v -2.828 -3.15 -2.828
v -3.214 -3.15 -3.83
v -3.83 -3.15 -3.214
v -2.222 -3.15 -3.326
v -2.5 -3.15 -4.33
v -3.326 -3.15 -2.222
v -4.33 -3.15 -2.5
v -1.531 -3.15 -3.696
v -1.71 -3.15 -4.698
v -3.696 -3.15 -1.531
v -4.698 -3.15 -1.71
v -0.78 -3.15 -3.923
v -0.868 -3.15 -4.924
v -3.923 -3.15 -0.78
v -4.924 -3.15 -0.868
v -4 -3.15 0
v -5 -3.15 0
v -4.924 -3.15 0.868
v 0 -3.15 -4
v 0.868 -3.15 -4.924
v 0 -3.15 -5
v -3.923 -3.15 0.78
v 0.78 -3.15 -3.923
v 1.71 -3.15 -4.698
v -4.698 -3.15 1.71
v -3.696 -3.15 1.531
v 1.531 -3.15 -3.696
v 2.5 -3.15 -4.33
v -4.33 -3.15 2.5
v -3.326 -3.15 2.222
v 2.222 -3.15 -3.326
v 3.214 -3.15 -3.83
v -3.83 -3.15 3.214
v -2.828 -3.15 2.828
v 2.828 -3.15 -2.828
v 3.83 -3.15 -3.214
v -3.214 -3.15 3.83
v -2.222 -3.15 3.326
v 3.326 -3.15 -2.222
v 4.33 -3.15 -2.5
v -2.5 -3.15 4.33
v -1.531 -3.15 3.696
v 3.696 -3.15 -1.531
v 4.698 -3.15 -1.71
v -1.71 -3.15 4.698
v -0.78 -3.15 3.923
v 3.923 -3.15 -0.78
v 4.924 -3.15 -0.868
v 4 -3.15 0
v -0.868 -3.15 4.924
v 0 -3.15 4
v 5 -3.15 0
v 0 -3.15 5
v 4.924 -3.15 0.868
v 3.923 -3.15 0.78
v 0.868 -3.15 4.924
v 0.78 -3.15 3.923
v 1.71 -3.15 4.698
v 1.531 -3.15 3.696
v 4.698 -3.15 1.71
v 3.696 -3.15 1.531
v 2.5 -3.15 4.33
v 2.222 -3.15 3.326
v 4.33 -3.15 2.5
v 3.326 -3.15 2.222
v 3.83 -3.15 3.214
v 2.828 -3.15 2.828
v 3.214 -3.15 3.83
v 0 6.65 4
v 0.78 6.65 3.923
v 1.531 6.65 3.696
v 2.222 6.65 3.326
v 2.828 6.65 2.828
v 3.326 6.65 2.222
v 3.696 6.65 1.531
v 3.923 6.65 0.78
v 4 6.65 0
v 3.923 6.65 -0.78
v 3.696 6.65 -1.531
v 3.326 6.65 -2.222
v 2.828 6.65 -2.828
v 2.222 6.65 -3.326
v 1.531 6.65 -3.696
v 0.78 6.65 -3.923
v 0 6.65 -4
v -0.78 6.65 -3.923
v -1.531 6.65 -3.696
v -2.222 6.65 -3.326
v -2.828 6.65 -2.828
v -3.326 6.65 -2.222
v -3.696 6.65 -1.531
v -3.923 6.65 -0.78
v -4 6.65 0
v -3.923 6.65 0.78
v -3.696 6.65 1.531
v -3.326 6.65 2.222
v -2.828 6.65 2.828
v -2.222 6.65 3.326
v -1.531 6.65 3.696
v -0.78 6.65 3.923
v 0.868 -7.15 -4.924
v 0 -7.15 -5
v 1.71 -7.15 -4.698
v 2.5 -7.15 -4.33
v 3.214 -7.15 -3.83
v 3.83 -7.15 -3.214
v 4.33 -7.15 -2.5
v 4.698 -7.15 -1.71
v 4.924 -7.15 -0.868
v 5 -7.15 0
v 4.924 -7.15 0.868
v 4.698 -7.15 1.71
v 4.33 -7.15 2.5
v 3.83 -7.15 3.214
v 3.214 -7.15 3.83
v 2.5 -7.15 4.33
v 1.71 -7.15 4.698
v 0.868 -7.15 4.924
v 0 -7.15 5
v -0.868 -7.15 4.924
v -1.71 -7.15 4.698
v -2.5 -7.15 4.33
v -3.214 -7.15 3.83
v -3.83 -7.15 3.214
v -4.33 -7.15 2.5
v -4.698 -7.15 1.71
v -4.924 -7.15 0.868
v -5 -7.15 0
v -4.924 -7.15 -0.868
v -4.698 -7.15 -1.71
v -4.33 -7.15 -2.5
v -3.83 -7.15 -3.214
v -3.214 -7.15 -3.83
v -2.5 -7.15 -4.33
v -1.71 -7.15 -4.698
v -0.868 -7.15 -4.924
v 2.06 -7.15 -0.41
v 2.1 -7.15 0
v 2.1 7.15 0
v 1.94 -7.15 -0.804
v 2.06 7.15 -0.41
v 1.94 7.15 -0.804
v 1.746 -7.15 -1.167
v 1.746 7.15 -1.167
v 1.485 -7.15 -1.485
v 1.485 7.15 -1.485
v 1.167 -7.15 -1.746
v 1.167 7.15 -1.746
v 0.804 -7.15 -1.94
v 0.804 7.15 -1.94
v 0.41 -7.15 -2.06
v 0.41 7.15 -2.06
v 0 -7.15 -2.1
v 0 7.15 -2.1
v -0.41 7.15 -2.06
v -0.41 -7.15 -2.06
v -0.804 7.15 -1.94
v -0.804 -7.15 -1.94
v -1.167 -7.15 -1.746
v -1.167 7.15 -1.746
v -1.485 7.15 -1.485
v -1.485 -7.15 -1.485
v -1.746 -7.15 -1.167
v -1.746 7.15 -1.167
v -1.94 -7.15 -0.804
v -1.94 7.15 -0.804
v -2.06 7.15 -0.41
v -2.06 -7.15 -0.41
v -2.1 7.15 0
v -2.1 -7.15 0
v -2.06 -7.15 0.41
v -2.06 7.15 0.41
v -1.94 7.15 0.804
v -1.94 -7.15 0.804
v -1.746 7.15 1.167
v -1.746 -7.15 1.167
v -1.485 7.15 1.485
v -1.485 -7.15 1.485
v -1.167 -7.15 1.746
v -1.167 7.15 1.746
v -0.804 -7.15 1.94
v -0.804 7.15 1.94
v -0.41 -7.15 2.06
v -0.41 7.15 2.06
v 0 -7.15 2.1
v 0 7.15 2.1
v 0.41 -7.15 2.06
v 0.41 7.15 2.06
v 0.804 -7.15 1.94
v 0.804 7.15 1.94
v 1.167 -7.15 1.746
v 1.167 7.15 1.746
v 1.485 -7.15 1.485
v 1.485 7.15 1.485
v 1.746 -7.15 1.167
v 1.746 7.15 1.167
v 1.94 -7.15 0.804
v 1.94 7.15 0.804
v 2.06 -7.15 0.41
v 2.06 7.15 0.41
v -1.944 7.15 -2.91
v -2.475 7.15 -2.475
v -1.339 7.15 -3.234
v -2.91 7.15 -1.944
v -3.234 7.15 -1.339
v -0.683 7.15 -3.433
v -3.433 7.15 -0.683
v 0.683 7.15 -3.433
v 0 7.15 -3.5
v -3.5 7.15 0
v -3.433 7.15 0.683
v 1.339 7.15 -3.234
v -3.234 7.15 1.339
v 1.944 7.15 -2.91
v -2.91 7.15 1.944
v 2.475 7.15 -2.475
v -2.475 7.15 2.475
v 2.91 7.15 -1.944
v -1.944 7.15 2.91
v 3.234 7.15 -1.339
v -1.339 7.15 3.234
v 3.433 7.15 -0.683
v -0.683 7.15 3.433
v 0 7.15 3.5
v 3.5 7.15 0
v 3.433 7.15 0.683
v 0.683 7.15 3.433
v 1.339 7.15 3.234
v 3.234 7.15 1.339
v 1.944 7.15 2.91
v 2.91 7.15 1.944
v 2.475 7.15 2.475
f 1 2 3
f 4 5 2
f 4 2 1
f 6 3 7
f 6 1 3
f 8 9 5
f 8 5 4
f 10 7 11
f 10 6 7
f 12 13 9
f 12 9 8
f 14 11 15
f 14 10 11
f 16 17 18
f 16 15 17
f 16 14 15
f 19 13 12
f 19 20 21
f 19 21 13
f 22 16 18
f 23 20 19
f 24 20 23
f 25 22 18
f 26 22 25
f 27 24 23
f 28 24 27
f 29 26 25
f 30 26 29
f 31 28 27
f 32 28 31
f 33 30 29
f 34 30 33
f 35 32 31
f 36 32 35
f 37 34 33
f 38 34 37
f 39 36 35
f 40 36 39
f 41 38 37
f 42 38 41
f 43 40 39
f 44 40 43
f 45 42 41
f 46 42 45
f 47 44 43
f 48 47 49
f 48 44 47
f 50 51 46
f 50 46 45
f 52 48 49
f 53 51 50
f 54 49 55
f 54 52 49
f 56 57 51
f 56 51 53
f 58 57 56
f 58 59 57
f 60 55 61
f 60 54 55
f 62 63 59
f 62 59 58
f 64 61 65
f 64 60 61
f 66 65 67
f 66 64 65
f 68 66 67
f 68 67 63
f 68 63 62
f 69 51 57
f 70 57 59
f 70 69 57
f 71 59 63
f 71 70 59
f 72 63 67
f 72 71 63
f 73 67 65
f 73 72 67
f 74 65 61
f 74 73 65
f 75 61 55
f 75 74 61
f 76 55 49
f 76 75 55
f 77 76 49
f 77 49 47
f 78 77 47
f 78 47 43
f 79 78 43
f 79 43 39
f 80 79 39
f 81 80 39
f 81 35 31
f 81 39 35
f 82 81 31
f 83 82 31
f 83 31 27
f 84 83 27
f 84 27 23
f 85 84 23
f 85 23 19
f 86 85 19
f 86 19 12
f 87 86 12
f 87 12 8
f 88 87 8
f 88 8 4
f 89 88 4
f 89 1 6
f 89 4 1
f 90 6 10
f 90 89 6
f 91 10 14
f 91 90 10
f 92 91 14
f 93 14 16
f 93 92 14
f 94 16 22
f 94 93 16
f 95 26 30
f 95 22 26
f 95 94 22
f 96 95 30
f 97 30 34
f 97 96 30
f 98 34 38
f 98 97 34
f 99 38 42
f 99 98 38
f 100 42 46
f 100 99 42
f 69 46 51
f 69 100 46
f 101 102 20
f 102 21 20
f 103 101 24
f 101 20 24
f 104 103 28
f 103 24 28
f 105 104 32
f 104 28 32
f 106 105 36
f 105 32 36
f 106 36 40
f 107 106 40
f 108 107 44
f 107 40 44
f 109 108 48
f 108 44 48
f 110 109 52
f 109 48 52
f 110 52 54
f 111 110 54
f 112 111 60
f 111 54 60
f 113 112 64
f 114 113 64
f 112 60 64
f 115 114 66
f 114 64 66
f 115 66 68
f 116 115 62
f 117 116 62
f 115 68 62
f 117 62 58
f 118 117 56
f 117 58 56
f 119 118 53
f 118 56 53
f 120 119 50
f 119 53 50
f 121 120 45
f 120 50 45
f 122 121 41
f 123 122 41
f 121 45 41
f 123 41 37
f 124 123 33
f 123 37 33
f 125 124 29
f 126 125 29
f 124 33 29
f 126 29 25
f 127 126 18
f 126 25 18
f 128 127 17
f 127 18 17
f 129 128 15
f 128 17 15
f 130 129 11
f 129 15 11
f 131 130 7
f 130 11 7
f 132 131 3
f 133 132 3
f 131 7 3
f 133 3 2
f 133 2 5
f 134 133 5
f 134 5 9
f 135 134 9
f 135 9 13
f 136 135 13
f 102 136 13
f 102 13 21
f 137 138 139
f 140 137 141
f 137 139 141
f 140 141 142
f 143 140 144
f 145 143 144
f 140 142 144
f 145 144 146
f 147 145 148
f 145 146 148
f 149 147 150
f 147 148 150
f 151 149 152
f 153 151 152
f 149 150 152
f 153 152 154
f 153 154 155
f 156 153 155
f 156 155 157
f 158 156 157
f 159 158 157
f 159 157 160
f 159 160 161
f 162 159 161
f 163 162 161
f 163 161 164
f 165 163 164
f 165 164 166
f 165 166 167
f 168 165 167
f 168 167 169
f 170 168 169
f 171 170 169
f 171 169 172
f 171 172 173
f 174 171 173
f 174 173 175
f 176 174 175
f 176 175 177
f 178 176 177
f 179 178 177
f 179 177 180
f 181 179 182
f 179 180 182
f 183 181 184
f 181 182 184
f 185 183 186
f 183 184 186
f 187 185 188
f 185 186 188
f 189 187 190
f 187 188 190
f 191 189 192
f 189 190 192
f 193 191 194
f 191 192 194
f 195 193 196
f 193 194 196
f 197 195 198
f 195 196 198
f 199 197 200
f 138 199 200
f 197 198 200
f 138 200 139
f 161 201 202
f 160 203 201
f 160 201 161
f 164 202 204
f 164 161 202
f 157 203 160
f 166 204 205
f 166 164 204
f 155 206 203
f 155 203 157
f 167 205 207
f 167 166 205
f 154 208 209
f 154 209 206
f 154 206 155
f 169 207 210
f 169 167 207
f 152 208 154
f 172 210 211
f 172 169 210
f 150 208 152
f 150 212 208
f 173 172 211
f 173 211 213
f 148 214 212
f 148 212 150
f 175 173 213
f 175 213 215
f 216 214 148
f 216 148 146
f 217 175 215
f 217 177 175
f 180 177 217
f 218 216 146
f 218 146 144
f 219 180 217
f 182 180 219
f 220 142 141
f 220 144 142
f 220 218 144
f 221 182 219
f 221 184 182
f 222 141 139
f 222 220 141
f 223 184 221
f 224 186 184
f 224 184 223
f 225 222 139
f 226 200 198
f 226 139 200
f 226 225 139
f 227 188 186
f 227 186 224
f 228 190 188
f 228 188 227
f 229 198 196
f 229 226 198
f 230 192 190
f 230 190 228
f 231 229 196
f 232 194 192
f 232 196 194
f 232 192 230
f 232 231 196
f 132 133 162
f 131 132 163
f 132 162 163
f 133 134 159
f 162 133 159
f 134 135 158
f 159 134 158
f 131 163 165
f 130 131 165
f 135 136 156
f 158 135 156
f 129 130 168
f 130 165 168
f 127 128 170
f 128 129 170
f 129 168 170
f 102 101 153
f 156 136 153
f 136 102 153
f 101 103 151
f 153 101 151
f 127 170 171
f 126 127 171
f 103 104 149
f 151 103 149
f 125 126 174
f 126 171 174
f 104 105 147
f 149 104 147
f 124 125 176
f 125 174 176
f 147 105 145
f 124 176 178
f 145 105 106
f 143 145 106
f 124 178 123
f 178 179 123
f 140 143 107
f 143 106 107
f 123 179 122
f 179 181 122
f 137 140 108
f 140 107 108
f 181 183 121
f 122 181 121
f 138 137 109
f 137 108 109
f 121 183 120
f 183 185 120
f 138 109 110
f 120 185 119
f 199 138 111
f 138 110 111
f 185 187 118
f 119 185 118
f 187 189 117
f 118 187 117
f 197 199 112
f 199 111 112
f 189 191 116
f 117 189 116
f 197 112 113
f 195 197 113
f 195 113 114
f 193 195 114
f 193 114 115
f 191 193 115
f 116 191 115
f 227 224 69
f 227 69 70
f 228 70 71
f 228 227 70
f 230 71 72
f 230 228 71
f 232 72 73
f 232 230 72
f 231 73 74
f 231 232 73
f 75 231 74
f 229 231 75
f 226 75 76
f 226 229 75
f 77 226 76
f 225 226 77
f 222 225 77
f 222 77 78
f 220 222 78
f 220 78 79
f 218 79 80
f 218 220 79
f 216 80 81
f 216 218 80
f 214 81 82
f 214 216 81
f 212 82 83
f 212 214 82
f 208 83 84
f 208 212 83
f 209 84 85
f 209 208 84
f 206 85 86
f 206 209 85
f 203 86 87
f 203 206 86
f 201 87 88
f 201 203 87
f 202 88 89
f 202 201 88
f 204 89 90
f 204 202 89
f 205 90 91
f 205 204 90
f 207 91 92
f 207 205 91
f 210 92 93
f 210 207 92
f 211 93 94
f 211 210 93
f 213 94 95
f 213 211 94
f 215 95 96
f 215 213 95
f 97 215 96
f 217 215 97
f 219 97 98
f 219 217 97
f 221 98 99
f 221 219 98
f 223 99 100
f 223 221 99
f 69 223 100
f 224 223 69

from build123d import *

# Parameters (mm, degrees)
SKETCH_1_R             = 4
EXTRUDE_1_DEPTH        = 7.15
SKETCH_2_W             = 1
SKETCH_2_H             = 4
CHAMFER_1_SIZE         = 0.5
HOLE_WIZARD_M5_1_D     = 4.2
HOLE_WIZARD_M5_1_DEPTH = 17.4
HOLE_WIZARD_M5_1_TIP   = 1.2618073


with BuildPart() as part:
    # 草图1 → 凸台-拉伸1 (new, symmetric)
    with BuildSketch(Plane(origin=(0, 0, 0), x_dir=(1, 0, 0), z_dir=(0, 1, 0))):
        with Locations(Location((0, 0, 0), (0, 0, 270))):
            Circle(SKETCH_1_R)
    extrude(amount=EXTRUDE_1_DEPTH, both=True)

    # 草图2 → 旋转1 (revolve)
    with BuildSketch(Plane.XY, mode=Mode.PRIVATE) as revolve_1_sk:
        with Locations((4.5, -5.15)):
            Rectangle(SKETCH_2_W, SKETCH_2_H)
    revolve(revolve_1_sk.sketch.rotate(Axis((0, 7.15, 0), (0, -1, 0)), 270), axis=Axis((0, 7.15, 0), (0, -1, 0)))

    # 倒角1
    chamfer_1_edges = [part.edges().sort_by_distance(p)[0] for p in [
        (0, 7.15, -4),
    ]]
    chamfer(chamfer_1_edges, length=CHAMFER_1_SIZE)

    # M5 螺纹孔1
    with Locations(Plane(origin=(0, -7.15, 0), x_dir=(-1, 0, 0), z_dir=(0, -1, 0))):
        with Locations((0, 0)):
            Hole(HOLE_WIZARD_M5_1_D / 2, depth=HOLE_WIZARD_M5_1_DEPTH)
            with Locations((0, 0, -(HOLE_WIZARD_M5_1_DEPTH + HOLE_WIZARD_M5_1_TIP / 2))):  # 118° drill point
                Cone(0, HOLE_WIZARD_M5_1_D / 2, HOLE_WIZARD_M5_1_TIP, mode=Mode.SUBTRACT)


solid = part.part
